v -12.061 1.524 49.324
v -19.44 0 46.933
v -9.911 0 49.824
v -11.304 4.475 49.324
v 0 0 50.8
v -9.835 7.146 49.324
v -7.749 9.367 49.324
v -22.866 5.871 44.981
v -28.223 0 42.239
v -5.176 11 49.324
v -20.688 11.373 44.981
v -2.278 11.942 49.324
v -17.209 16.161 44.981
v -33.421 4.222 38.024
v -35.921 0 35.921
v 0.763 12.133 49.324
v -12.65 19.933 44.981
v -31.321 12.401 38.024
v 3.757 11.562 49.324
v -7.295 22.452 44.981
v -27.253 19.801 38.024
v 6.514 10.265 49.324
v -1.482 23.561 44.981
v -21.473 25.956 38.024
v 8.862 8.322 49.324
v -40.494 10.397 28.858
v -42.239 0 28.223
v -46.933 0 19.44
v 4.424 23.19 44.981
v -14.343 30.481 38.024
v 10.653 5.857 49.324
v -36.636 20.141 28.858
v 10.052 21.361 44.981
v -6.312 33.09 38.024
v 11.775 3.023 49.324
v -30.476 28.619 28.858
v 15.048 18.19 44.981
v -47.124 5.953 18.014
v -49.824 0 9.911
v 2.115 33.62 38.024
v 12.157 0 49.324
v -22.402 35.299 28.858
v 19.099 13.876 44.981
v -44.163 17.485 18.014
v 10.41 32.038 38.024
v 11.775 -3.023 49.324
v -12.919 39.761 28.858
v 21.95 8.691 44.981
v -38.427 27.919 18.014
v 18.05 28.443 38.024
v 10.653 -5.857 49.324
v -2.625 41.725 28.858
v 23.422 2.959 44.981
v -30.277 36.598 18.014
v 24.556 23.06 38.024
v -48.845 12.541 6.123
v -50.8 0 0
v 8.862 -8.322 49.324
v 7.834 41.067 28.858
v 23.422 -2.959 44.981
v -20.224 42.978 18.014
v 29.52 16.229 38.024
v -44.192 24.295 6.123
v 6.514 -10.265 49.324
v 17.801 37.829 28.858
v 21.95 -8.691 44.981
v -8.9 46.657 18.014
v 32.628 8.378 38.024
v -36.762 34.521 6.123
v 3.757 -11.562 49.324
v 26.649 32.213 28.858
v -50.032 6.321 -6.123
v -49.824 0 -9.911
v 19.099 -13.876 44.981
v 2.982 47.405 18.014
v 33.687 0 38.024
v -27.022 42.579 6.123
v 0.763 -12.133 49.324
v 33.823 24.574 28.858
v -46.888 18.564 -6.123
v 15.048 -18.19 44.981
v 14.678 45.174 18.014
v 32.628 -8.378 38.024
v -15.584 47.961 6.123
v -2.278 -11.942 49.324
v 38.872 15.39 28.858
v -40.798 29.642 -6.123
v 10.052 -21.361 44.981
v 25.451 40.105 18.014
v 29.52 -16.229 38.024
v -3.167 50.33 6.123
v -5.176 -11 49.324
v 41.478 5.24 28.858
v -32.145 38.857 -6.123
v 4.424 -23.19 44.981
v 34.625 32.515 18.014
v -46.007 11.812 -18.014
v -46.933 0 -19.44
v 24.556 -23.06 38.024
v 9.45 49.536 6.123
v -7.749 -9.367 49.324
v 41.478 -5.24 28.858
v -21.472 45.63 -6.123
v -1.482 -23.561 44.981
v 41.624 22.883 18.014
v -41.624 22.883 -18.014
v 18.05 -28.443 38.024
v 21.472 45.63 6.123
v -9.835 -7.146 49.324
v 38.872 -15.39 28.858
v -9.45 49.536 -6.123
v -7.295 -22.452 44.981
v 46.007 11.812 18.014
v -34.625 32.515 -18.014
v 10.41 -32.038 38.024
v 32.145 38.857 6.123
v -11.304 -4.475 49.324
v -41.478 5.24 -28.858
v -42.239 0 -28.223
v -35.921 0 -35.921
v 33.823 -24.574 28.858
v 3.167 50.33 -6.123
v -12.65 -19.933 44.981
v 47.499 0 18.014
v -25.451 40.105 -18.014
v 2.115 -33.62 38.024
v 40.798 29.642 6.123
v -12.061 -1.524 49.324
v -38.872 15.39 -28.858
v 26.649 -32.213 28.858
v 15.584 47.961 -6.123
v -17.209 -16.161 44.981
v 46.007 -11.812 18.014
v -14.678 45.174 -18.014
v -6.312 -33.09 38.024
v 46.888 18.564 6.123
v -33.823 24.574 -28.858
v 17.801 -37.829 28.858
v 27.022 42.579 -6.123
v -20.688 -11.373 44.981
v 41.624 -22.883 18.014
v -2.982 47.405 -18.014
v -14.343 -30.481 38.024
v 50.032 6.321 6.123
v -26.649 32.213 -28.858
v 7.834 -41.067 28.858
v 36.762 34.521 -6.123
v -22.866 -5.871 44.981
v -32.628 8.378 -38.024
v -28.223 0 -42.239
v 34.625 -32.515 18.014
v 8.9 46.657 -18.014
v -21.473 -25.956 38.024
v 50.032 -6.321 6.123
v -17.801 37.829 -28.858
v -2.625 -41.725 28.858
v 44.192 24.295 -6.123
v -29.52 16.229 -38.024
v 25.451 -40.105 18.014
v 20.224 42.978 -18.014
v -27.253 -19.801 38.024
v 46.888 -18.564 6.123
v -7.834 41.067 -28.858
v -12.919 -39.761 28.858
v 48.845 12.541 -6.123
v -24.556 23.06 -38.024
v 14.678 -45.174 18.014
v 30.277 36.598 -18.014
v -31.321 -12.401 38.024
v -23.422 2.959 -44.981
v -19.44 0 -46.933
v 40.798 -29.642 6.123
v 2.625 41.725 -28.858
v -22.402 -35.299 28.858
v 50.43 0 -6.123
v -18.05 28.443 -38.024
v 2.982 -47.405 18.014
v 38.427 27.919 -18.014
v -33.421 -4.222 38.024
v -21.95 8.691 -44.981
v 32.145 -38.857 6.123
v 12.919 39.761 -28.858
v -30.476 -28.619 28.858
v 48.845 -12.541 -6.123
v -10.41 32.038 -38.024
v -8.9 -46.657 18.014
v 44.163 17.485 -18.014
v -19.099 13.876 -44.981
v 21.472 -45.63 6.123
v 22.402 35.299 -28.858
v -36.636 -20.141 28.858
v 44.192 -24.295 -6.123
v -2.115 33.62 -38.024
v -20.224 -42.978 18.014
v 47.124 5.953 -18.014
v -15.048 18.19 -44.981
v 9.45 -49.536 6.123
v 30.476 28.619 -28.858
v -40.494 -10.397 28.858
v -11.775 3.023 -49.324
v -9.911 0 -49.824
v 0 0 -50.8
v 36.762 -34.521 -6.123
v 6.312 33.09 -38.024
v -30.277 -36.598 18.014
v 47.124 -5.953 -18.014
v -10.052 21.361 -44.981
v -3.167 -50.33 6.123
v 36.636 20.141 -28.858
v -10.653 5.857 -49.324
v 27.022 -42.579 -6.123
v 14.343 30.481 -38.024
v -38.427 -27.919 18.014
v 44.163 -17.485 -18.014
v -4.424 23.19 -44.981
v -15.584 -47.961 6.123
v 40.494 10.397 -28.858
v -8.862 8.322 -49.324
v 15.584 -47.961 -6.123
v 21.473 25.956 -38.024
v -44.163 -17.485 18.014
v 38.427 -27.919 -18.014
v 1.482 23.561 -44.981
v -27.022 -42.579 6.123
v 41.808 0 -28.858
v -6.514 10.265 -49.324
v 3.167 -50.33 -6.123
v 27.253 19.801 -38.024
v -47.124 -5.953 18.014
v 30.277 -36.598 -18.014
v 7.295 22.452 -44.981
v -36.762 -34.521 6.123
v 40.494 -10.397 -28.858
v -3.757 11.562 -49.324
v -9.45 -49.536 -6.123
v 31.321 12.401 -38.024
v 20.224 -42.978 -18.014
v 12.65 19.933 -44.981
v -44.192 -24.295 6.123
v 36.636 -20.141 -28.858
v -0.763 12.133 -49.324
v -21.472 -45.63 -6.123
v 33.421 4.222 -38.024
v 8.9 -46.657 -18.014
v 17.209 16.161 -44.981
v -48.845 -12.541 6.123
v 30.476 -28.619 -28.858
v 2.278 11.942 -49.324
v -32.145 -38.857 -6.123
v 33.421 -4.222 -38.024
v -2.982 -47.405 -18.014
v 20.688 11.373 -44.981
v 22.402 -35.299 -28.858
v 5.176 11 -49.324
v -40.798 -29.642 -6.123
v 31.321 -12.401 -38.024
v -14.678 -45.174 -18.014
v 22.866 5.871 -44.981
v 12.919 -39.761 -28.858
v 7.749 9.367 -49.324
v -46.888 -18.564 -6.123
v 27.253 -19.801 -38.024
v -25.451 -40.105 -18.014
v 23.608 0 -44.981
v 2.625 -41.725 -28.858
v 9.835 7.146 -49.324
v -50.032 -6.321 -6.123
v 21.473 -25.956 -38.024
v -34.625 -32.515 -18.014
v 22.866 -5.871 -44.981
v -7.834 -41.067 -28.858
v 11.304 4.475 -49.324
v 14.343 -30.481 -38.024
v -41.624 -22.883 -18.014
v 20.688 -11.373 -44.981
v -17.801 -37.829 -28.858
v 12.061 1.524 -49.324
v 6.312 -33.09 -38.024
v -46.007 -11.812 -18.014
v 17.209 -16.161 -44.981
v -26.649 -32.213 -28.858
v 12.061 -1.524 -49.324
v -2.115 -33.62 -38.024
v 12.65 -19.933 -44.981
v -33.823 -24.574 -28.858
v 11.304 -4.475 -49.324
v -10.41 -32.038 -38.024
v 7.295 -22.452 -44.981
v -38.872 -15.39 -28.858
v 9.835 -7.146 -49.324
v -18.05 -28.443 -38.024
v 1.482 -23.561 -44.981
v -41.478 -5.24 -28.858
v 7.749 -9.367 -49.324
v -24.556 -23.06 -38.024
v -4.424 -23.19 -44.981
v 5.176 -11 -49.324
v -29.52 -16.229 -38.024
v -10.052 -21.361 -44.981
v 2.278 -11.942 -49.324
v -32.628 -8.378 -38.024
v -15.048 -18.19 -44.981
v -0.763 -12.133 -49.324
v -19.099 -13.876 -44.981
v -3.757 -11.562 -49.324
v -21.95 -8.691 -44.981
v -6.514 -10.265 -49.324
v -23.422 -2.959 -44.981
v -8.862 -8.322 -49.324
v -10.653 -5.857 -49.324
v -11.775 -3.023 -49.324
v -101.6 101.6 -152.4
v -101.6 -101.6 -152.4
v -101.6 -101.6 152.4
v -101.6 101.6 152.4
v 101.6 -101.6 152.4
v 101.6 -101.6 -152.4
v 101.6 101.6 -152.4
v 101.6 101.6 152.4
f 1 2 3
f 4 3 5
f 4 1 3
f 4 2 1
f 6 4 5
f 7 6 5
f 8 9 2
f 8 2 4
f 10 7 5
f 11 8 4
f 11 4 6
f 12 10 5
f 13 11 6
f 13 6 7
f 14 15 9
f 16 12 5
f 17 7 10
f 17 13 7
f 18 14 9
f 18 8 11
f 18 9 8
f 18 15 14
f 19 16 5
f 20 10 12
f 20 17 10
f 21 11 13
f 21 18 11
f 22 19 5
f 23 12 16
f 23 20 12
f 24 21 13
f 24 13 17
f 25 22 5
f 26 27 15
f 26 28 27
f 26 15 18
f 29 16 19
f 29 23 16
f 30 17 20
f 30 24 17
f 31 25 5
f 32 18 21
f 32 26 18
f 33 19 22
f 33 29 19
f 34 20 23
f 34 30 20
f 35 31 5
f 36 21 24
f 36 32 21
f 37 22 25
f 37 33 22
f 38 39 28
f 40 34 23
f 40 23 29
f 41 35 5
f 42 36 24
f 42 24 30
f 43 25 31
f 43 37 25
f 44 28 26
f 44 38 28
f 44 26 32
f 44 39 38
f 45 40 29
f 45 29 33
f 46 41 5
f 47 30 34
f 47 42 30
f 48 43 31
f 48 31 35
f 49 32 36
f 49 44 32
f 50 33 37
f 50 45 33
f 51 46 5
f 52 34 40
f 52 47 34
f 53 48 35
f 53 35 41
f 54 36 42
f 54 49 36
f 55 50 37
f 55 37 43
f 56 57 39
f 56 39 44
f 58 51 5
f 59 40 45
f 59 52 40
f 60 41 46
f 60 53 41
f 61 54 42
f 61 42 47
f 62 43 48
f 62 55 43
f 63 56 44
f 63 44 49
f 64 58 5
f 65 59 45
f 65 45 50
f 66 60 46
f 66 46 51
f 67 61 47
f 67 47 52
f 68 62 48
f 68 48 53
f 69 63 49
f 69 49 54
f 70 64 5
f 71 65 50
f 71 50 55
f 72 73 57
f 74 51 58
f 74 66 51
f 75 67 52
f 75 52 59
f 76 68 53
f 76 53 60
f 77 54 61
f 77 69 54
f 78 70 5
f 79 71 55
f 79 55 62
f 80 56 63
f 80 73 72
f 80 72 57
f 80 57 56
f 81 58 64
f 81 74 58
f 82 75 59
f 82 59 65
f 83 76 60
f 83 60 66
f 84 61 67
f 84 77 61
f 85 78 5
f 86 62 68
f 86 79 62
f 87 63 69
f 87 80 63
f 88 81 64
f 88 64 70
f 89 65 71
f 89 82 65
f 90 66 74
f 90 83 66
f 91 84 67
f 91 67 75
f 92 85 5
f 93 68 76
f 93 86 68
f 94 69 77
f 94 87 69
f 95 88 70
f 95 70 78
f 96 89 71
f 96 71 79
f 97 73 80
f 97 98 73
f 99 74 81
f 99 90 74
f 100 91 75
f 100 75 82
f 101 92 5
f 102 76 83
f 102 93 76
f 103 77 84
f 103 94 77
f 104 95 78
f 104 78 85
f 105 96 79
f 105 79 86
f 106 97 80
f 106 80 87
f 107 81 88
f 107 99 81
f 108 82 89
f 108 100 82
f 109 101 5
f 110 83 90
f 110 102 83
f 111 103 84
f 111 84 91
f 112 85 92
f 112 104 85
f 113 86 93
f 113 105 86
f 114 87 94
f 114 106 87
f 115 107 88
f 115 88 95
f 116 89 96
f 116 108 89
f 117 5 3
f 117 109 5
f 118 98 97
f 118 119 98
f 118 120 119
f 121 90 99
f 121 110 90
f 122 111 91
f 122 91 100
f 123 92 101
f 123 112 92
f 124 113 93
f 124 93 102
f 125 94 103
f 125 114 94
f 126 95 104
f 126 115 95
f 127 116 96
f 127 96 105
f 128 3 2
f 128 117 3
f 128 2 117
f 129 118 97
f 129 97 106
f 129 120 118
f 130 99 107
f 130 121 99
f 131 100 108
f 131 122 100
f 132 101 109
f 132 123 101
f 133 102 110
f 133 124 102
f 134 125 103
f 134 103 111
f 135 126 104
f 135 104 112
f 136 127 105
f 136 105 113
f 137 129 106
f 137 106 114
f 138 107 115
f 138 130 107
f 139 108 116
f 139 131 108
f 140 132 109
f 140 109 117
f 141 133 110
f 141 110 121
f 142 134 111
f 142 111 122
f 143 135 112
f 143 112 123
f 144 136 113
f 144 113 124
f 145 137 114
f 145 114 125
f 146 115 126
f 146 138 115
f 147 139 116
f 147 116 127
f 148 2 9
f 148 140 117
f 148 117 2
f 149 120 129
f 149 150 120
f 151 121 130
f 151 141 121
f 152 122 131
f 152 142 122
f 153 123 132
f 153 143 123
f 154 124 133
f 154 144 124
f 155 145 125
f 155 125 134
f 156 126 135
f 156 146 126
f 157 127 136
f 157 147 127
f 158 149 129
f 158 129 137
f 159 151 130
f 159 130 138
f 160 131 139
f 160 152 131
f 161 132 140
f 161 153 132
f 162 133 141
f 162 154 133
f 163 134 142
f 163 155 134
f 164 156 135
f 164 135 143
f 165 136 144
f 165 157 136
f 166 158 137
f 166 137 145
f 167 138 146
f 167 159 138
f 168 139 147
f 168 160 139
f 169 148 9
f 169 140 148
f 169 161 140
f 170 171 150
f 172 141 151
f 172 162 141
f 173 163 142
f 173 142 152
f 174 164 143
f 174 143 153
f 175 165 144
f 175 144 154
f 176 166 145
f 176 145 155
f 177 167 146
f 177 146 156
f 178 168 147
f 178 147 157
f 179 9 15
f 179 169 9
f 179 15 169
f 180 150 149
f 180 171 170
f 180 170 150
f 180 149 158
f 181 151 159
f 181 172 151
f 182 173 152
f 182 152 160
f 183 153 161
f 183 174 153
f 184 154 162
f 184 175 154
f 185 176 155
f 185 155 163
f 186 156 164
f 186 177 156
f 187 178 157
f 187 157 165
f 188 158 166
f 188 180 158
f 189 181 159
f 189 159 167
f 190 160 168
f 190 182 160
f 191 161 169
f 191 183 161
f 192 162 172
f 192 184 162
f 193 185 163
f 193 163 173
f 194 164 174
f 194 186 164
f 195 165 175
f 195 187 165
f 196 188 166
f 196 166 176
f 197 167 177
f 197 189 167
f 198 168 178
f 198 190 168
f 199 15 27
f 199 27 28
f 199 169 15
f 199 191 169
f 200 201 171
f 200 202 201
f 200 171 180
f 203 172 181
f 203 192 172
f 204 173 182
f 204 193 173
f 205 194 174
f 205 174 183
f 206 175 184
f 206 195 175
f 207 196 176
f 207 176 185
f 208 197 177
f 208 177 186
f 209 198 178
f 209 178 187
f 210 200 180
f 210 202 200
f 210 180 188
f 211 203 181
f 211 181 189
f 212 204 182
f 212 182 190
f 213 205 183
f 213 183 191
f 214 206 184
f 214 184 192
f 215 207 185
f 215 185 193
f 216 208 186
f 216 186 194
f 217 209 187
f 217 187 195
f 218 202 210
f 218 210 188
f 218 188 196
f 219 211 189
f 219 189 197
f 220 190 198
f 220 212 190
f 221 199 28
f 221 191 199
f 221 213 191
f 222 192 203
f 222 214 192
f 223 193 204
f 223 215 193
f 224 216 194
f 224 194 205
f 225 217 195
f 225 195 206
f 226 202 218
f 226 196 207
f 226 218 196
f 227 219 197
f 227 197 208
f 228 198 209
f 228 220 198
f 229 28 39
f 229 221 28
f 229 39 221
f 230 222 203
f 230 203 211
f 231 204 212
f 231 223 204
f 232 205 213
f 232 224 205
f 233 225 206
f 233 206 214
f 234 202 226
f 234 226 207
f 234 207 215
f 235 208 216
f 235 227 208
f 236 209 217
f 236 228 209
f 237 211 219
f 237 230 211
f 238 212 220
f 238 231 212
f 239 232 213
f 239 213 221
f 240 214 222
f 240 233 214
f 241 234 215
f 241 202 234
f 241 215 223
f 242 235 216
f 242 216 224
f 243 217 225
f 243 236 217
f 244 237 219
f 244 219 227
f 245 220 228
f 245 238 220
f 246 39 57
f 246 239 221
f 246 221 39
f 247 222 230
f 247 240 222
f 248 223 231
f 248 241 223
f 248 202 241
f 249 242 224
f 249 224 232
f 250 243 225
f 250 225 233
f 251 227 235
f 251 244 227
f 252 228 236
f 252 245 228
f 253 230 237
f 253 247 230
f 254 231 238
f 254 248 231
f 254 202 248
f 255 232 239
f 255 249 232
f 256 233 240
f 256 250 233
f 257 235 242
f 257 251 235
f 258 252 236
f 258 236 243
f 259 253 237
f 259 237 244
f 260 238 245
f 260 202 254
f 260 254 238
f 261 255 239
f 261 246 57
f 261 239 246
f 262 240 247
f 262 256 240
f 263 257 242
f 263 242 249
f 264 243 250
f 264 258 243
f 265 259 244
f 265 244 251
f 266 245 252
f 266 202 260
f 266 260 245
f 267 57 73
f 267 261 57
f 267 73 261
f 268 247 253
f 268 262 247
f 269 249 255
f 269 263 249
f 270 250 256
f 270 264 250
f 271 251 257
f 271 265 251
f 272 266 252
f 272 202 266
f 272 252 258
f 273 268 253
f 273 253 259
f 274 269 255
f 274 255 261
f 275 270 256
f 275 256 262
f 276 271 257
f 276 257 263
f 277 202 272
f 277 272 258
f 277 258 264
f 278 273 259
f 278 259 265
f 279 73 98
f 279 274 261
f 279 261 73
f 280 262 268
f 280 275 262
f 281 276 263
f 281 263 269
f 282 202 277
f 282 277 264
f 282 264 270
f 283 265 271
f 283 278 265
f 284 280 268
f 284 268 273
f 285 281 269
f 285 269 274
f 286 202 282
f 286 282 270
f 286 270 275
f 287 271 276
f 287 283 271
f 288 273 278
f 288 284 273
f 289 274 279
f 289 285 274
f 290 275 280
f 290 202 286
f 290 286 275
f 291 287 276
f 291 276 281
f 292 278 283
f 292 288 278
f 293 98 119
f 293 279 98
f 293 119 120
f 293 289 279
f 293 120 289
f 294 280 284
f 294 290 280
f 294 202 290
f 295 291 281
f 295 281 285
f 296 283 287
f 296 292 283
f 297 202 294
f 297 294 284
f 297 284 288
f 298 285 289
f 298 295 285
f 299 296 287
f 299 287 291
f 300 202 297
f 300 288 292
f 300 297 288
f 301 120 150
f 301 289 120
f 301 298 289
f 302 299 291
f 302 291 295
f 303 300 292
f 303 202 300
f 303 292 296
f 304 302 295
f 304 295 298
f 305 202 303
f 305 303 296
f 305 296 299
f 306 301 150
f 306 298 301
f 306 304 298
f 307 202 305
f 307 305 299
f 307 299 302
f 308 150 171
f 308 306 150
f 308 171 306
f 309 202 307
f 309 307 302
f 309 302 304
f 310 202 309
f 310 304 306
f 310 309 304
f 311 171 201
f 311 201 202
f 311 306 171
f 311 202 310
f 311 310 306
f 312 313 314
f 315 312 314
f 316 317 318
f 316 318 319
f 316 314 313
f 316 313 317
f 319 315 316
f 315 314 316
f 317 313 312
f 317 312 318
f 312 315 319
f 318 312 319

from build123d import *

# Parameters (mm, degrees)
F0_W     = 203.2
F0_H     = 304.8
F1_DEPTH = 101.6


with BuildPart() as f1:
    # F0 (on Front) → F1 (new body, symmetric)
    with BuildSketch(Plane.XZ):
        Rectangle(F0_W, F0_H)
    extrude(amount=F1_DEPTH, both=True)


with BuildPart() as f3:
    # F2 (on Front) → F3 (revolve)
    with BuildSketch(Plane.XZ):
        with BuildLine():
            Line((0, -50.8), (0, 50.8))
            ThreePointArc((0, 50.8), (-50.8, 0), (0, -50.8))
        make_face()
    revolve(axis=Axis((0, 0, 0), (0, 0, -1)))


solid = Compound([f1.part, f3.part])
